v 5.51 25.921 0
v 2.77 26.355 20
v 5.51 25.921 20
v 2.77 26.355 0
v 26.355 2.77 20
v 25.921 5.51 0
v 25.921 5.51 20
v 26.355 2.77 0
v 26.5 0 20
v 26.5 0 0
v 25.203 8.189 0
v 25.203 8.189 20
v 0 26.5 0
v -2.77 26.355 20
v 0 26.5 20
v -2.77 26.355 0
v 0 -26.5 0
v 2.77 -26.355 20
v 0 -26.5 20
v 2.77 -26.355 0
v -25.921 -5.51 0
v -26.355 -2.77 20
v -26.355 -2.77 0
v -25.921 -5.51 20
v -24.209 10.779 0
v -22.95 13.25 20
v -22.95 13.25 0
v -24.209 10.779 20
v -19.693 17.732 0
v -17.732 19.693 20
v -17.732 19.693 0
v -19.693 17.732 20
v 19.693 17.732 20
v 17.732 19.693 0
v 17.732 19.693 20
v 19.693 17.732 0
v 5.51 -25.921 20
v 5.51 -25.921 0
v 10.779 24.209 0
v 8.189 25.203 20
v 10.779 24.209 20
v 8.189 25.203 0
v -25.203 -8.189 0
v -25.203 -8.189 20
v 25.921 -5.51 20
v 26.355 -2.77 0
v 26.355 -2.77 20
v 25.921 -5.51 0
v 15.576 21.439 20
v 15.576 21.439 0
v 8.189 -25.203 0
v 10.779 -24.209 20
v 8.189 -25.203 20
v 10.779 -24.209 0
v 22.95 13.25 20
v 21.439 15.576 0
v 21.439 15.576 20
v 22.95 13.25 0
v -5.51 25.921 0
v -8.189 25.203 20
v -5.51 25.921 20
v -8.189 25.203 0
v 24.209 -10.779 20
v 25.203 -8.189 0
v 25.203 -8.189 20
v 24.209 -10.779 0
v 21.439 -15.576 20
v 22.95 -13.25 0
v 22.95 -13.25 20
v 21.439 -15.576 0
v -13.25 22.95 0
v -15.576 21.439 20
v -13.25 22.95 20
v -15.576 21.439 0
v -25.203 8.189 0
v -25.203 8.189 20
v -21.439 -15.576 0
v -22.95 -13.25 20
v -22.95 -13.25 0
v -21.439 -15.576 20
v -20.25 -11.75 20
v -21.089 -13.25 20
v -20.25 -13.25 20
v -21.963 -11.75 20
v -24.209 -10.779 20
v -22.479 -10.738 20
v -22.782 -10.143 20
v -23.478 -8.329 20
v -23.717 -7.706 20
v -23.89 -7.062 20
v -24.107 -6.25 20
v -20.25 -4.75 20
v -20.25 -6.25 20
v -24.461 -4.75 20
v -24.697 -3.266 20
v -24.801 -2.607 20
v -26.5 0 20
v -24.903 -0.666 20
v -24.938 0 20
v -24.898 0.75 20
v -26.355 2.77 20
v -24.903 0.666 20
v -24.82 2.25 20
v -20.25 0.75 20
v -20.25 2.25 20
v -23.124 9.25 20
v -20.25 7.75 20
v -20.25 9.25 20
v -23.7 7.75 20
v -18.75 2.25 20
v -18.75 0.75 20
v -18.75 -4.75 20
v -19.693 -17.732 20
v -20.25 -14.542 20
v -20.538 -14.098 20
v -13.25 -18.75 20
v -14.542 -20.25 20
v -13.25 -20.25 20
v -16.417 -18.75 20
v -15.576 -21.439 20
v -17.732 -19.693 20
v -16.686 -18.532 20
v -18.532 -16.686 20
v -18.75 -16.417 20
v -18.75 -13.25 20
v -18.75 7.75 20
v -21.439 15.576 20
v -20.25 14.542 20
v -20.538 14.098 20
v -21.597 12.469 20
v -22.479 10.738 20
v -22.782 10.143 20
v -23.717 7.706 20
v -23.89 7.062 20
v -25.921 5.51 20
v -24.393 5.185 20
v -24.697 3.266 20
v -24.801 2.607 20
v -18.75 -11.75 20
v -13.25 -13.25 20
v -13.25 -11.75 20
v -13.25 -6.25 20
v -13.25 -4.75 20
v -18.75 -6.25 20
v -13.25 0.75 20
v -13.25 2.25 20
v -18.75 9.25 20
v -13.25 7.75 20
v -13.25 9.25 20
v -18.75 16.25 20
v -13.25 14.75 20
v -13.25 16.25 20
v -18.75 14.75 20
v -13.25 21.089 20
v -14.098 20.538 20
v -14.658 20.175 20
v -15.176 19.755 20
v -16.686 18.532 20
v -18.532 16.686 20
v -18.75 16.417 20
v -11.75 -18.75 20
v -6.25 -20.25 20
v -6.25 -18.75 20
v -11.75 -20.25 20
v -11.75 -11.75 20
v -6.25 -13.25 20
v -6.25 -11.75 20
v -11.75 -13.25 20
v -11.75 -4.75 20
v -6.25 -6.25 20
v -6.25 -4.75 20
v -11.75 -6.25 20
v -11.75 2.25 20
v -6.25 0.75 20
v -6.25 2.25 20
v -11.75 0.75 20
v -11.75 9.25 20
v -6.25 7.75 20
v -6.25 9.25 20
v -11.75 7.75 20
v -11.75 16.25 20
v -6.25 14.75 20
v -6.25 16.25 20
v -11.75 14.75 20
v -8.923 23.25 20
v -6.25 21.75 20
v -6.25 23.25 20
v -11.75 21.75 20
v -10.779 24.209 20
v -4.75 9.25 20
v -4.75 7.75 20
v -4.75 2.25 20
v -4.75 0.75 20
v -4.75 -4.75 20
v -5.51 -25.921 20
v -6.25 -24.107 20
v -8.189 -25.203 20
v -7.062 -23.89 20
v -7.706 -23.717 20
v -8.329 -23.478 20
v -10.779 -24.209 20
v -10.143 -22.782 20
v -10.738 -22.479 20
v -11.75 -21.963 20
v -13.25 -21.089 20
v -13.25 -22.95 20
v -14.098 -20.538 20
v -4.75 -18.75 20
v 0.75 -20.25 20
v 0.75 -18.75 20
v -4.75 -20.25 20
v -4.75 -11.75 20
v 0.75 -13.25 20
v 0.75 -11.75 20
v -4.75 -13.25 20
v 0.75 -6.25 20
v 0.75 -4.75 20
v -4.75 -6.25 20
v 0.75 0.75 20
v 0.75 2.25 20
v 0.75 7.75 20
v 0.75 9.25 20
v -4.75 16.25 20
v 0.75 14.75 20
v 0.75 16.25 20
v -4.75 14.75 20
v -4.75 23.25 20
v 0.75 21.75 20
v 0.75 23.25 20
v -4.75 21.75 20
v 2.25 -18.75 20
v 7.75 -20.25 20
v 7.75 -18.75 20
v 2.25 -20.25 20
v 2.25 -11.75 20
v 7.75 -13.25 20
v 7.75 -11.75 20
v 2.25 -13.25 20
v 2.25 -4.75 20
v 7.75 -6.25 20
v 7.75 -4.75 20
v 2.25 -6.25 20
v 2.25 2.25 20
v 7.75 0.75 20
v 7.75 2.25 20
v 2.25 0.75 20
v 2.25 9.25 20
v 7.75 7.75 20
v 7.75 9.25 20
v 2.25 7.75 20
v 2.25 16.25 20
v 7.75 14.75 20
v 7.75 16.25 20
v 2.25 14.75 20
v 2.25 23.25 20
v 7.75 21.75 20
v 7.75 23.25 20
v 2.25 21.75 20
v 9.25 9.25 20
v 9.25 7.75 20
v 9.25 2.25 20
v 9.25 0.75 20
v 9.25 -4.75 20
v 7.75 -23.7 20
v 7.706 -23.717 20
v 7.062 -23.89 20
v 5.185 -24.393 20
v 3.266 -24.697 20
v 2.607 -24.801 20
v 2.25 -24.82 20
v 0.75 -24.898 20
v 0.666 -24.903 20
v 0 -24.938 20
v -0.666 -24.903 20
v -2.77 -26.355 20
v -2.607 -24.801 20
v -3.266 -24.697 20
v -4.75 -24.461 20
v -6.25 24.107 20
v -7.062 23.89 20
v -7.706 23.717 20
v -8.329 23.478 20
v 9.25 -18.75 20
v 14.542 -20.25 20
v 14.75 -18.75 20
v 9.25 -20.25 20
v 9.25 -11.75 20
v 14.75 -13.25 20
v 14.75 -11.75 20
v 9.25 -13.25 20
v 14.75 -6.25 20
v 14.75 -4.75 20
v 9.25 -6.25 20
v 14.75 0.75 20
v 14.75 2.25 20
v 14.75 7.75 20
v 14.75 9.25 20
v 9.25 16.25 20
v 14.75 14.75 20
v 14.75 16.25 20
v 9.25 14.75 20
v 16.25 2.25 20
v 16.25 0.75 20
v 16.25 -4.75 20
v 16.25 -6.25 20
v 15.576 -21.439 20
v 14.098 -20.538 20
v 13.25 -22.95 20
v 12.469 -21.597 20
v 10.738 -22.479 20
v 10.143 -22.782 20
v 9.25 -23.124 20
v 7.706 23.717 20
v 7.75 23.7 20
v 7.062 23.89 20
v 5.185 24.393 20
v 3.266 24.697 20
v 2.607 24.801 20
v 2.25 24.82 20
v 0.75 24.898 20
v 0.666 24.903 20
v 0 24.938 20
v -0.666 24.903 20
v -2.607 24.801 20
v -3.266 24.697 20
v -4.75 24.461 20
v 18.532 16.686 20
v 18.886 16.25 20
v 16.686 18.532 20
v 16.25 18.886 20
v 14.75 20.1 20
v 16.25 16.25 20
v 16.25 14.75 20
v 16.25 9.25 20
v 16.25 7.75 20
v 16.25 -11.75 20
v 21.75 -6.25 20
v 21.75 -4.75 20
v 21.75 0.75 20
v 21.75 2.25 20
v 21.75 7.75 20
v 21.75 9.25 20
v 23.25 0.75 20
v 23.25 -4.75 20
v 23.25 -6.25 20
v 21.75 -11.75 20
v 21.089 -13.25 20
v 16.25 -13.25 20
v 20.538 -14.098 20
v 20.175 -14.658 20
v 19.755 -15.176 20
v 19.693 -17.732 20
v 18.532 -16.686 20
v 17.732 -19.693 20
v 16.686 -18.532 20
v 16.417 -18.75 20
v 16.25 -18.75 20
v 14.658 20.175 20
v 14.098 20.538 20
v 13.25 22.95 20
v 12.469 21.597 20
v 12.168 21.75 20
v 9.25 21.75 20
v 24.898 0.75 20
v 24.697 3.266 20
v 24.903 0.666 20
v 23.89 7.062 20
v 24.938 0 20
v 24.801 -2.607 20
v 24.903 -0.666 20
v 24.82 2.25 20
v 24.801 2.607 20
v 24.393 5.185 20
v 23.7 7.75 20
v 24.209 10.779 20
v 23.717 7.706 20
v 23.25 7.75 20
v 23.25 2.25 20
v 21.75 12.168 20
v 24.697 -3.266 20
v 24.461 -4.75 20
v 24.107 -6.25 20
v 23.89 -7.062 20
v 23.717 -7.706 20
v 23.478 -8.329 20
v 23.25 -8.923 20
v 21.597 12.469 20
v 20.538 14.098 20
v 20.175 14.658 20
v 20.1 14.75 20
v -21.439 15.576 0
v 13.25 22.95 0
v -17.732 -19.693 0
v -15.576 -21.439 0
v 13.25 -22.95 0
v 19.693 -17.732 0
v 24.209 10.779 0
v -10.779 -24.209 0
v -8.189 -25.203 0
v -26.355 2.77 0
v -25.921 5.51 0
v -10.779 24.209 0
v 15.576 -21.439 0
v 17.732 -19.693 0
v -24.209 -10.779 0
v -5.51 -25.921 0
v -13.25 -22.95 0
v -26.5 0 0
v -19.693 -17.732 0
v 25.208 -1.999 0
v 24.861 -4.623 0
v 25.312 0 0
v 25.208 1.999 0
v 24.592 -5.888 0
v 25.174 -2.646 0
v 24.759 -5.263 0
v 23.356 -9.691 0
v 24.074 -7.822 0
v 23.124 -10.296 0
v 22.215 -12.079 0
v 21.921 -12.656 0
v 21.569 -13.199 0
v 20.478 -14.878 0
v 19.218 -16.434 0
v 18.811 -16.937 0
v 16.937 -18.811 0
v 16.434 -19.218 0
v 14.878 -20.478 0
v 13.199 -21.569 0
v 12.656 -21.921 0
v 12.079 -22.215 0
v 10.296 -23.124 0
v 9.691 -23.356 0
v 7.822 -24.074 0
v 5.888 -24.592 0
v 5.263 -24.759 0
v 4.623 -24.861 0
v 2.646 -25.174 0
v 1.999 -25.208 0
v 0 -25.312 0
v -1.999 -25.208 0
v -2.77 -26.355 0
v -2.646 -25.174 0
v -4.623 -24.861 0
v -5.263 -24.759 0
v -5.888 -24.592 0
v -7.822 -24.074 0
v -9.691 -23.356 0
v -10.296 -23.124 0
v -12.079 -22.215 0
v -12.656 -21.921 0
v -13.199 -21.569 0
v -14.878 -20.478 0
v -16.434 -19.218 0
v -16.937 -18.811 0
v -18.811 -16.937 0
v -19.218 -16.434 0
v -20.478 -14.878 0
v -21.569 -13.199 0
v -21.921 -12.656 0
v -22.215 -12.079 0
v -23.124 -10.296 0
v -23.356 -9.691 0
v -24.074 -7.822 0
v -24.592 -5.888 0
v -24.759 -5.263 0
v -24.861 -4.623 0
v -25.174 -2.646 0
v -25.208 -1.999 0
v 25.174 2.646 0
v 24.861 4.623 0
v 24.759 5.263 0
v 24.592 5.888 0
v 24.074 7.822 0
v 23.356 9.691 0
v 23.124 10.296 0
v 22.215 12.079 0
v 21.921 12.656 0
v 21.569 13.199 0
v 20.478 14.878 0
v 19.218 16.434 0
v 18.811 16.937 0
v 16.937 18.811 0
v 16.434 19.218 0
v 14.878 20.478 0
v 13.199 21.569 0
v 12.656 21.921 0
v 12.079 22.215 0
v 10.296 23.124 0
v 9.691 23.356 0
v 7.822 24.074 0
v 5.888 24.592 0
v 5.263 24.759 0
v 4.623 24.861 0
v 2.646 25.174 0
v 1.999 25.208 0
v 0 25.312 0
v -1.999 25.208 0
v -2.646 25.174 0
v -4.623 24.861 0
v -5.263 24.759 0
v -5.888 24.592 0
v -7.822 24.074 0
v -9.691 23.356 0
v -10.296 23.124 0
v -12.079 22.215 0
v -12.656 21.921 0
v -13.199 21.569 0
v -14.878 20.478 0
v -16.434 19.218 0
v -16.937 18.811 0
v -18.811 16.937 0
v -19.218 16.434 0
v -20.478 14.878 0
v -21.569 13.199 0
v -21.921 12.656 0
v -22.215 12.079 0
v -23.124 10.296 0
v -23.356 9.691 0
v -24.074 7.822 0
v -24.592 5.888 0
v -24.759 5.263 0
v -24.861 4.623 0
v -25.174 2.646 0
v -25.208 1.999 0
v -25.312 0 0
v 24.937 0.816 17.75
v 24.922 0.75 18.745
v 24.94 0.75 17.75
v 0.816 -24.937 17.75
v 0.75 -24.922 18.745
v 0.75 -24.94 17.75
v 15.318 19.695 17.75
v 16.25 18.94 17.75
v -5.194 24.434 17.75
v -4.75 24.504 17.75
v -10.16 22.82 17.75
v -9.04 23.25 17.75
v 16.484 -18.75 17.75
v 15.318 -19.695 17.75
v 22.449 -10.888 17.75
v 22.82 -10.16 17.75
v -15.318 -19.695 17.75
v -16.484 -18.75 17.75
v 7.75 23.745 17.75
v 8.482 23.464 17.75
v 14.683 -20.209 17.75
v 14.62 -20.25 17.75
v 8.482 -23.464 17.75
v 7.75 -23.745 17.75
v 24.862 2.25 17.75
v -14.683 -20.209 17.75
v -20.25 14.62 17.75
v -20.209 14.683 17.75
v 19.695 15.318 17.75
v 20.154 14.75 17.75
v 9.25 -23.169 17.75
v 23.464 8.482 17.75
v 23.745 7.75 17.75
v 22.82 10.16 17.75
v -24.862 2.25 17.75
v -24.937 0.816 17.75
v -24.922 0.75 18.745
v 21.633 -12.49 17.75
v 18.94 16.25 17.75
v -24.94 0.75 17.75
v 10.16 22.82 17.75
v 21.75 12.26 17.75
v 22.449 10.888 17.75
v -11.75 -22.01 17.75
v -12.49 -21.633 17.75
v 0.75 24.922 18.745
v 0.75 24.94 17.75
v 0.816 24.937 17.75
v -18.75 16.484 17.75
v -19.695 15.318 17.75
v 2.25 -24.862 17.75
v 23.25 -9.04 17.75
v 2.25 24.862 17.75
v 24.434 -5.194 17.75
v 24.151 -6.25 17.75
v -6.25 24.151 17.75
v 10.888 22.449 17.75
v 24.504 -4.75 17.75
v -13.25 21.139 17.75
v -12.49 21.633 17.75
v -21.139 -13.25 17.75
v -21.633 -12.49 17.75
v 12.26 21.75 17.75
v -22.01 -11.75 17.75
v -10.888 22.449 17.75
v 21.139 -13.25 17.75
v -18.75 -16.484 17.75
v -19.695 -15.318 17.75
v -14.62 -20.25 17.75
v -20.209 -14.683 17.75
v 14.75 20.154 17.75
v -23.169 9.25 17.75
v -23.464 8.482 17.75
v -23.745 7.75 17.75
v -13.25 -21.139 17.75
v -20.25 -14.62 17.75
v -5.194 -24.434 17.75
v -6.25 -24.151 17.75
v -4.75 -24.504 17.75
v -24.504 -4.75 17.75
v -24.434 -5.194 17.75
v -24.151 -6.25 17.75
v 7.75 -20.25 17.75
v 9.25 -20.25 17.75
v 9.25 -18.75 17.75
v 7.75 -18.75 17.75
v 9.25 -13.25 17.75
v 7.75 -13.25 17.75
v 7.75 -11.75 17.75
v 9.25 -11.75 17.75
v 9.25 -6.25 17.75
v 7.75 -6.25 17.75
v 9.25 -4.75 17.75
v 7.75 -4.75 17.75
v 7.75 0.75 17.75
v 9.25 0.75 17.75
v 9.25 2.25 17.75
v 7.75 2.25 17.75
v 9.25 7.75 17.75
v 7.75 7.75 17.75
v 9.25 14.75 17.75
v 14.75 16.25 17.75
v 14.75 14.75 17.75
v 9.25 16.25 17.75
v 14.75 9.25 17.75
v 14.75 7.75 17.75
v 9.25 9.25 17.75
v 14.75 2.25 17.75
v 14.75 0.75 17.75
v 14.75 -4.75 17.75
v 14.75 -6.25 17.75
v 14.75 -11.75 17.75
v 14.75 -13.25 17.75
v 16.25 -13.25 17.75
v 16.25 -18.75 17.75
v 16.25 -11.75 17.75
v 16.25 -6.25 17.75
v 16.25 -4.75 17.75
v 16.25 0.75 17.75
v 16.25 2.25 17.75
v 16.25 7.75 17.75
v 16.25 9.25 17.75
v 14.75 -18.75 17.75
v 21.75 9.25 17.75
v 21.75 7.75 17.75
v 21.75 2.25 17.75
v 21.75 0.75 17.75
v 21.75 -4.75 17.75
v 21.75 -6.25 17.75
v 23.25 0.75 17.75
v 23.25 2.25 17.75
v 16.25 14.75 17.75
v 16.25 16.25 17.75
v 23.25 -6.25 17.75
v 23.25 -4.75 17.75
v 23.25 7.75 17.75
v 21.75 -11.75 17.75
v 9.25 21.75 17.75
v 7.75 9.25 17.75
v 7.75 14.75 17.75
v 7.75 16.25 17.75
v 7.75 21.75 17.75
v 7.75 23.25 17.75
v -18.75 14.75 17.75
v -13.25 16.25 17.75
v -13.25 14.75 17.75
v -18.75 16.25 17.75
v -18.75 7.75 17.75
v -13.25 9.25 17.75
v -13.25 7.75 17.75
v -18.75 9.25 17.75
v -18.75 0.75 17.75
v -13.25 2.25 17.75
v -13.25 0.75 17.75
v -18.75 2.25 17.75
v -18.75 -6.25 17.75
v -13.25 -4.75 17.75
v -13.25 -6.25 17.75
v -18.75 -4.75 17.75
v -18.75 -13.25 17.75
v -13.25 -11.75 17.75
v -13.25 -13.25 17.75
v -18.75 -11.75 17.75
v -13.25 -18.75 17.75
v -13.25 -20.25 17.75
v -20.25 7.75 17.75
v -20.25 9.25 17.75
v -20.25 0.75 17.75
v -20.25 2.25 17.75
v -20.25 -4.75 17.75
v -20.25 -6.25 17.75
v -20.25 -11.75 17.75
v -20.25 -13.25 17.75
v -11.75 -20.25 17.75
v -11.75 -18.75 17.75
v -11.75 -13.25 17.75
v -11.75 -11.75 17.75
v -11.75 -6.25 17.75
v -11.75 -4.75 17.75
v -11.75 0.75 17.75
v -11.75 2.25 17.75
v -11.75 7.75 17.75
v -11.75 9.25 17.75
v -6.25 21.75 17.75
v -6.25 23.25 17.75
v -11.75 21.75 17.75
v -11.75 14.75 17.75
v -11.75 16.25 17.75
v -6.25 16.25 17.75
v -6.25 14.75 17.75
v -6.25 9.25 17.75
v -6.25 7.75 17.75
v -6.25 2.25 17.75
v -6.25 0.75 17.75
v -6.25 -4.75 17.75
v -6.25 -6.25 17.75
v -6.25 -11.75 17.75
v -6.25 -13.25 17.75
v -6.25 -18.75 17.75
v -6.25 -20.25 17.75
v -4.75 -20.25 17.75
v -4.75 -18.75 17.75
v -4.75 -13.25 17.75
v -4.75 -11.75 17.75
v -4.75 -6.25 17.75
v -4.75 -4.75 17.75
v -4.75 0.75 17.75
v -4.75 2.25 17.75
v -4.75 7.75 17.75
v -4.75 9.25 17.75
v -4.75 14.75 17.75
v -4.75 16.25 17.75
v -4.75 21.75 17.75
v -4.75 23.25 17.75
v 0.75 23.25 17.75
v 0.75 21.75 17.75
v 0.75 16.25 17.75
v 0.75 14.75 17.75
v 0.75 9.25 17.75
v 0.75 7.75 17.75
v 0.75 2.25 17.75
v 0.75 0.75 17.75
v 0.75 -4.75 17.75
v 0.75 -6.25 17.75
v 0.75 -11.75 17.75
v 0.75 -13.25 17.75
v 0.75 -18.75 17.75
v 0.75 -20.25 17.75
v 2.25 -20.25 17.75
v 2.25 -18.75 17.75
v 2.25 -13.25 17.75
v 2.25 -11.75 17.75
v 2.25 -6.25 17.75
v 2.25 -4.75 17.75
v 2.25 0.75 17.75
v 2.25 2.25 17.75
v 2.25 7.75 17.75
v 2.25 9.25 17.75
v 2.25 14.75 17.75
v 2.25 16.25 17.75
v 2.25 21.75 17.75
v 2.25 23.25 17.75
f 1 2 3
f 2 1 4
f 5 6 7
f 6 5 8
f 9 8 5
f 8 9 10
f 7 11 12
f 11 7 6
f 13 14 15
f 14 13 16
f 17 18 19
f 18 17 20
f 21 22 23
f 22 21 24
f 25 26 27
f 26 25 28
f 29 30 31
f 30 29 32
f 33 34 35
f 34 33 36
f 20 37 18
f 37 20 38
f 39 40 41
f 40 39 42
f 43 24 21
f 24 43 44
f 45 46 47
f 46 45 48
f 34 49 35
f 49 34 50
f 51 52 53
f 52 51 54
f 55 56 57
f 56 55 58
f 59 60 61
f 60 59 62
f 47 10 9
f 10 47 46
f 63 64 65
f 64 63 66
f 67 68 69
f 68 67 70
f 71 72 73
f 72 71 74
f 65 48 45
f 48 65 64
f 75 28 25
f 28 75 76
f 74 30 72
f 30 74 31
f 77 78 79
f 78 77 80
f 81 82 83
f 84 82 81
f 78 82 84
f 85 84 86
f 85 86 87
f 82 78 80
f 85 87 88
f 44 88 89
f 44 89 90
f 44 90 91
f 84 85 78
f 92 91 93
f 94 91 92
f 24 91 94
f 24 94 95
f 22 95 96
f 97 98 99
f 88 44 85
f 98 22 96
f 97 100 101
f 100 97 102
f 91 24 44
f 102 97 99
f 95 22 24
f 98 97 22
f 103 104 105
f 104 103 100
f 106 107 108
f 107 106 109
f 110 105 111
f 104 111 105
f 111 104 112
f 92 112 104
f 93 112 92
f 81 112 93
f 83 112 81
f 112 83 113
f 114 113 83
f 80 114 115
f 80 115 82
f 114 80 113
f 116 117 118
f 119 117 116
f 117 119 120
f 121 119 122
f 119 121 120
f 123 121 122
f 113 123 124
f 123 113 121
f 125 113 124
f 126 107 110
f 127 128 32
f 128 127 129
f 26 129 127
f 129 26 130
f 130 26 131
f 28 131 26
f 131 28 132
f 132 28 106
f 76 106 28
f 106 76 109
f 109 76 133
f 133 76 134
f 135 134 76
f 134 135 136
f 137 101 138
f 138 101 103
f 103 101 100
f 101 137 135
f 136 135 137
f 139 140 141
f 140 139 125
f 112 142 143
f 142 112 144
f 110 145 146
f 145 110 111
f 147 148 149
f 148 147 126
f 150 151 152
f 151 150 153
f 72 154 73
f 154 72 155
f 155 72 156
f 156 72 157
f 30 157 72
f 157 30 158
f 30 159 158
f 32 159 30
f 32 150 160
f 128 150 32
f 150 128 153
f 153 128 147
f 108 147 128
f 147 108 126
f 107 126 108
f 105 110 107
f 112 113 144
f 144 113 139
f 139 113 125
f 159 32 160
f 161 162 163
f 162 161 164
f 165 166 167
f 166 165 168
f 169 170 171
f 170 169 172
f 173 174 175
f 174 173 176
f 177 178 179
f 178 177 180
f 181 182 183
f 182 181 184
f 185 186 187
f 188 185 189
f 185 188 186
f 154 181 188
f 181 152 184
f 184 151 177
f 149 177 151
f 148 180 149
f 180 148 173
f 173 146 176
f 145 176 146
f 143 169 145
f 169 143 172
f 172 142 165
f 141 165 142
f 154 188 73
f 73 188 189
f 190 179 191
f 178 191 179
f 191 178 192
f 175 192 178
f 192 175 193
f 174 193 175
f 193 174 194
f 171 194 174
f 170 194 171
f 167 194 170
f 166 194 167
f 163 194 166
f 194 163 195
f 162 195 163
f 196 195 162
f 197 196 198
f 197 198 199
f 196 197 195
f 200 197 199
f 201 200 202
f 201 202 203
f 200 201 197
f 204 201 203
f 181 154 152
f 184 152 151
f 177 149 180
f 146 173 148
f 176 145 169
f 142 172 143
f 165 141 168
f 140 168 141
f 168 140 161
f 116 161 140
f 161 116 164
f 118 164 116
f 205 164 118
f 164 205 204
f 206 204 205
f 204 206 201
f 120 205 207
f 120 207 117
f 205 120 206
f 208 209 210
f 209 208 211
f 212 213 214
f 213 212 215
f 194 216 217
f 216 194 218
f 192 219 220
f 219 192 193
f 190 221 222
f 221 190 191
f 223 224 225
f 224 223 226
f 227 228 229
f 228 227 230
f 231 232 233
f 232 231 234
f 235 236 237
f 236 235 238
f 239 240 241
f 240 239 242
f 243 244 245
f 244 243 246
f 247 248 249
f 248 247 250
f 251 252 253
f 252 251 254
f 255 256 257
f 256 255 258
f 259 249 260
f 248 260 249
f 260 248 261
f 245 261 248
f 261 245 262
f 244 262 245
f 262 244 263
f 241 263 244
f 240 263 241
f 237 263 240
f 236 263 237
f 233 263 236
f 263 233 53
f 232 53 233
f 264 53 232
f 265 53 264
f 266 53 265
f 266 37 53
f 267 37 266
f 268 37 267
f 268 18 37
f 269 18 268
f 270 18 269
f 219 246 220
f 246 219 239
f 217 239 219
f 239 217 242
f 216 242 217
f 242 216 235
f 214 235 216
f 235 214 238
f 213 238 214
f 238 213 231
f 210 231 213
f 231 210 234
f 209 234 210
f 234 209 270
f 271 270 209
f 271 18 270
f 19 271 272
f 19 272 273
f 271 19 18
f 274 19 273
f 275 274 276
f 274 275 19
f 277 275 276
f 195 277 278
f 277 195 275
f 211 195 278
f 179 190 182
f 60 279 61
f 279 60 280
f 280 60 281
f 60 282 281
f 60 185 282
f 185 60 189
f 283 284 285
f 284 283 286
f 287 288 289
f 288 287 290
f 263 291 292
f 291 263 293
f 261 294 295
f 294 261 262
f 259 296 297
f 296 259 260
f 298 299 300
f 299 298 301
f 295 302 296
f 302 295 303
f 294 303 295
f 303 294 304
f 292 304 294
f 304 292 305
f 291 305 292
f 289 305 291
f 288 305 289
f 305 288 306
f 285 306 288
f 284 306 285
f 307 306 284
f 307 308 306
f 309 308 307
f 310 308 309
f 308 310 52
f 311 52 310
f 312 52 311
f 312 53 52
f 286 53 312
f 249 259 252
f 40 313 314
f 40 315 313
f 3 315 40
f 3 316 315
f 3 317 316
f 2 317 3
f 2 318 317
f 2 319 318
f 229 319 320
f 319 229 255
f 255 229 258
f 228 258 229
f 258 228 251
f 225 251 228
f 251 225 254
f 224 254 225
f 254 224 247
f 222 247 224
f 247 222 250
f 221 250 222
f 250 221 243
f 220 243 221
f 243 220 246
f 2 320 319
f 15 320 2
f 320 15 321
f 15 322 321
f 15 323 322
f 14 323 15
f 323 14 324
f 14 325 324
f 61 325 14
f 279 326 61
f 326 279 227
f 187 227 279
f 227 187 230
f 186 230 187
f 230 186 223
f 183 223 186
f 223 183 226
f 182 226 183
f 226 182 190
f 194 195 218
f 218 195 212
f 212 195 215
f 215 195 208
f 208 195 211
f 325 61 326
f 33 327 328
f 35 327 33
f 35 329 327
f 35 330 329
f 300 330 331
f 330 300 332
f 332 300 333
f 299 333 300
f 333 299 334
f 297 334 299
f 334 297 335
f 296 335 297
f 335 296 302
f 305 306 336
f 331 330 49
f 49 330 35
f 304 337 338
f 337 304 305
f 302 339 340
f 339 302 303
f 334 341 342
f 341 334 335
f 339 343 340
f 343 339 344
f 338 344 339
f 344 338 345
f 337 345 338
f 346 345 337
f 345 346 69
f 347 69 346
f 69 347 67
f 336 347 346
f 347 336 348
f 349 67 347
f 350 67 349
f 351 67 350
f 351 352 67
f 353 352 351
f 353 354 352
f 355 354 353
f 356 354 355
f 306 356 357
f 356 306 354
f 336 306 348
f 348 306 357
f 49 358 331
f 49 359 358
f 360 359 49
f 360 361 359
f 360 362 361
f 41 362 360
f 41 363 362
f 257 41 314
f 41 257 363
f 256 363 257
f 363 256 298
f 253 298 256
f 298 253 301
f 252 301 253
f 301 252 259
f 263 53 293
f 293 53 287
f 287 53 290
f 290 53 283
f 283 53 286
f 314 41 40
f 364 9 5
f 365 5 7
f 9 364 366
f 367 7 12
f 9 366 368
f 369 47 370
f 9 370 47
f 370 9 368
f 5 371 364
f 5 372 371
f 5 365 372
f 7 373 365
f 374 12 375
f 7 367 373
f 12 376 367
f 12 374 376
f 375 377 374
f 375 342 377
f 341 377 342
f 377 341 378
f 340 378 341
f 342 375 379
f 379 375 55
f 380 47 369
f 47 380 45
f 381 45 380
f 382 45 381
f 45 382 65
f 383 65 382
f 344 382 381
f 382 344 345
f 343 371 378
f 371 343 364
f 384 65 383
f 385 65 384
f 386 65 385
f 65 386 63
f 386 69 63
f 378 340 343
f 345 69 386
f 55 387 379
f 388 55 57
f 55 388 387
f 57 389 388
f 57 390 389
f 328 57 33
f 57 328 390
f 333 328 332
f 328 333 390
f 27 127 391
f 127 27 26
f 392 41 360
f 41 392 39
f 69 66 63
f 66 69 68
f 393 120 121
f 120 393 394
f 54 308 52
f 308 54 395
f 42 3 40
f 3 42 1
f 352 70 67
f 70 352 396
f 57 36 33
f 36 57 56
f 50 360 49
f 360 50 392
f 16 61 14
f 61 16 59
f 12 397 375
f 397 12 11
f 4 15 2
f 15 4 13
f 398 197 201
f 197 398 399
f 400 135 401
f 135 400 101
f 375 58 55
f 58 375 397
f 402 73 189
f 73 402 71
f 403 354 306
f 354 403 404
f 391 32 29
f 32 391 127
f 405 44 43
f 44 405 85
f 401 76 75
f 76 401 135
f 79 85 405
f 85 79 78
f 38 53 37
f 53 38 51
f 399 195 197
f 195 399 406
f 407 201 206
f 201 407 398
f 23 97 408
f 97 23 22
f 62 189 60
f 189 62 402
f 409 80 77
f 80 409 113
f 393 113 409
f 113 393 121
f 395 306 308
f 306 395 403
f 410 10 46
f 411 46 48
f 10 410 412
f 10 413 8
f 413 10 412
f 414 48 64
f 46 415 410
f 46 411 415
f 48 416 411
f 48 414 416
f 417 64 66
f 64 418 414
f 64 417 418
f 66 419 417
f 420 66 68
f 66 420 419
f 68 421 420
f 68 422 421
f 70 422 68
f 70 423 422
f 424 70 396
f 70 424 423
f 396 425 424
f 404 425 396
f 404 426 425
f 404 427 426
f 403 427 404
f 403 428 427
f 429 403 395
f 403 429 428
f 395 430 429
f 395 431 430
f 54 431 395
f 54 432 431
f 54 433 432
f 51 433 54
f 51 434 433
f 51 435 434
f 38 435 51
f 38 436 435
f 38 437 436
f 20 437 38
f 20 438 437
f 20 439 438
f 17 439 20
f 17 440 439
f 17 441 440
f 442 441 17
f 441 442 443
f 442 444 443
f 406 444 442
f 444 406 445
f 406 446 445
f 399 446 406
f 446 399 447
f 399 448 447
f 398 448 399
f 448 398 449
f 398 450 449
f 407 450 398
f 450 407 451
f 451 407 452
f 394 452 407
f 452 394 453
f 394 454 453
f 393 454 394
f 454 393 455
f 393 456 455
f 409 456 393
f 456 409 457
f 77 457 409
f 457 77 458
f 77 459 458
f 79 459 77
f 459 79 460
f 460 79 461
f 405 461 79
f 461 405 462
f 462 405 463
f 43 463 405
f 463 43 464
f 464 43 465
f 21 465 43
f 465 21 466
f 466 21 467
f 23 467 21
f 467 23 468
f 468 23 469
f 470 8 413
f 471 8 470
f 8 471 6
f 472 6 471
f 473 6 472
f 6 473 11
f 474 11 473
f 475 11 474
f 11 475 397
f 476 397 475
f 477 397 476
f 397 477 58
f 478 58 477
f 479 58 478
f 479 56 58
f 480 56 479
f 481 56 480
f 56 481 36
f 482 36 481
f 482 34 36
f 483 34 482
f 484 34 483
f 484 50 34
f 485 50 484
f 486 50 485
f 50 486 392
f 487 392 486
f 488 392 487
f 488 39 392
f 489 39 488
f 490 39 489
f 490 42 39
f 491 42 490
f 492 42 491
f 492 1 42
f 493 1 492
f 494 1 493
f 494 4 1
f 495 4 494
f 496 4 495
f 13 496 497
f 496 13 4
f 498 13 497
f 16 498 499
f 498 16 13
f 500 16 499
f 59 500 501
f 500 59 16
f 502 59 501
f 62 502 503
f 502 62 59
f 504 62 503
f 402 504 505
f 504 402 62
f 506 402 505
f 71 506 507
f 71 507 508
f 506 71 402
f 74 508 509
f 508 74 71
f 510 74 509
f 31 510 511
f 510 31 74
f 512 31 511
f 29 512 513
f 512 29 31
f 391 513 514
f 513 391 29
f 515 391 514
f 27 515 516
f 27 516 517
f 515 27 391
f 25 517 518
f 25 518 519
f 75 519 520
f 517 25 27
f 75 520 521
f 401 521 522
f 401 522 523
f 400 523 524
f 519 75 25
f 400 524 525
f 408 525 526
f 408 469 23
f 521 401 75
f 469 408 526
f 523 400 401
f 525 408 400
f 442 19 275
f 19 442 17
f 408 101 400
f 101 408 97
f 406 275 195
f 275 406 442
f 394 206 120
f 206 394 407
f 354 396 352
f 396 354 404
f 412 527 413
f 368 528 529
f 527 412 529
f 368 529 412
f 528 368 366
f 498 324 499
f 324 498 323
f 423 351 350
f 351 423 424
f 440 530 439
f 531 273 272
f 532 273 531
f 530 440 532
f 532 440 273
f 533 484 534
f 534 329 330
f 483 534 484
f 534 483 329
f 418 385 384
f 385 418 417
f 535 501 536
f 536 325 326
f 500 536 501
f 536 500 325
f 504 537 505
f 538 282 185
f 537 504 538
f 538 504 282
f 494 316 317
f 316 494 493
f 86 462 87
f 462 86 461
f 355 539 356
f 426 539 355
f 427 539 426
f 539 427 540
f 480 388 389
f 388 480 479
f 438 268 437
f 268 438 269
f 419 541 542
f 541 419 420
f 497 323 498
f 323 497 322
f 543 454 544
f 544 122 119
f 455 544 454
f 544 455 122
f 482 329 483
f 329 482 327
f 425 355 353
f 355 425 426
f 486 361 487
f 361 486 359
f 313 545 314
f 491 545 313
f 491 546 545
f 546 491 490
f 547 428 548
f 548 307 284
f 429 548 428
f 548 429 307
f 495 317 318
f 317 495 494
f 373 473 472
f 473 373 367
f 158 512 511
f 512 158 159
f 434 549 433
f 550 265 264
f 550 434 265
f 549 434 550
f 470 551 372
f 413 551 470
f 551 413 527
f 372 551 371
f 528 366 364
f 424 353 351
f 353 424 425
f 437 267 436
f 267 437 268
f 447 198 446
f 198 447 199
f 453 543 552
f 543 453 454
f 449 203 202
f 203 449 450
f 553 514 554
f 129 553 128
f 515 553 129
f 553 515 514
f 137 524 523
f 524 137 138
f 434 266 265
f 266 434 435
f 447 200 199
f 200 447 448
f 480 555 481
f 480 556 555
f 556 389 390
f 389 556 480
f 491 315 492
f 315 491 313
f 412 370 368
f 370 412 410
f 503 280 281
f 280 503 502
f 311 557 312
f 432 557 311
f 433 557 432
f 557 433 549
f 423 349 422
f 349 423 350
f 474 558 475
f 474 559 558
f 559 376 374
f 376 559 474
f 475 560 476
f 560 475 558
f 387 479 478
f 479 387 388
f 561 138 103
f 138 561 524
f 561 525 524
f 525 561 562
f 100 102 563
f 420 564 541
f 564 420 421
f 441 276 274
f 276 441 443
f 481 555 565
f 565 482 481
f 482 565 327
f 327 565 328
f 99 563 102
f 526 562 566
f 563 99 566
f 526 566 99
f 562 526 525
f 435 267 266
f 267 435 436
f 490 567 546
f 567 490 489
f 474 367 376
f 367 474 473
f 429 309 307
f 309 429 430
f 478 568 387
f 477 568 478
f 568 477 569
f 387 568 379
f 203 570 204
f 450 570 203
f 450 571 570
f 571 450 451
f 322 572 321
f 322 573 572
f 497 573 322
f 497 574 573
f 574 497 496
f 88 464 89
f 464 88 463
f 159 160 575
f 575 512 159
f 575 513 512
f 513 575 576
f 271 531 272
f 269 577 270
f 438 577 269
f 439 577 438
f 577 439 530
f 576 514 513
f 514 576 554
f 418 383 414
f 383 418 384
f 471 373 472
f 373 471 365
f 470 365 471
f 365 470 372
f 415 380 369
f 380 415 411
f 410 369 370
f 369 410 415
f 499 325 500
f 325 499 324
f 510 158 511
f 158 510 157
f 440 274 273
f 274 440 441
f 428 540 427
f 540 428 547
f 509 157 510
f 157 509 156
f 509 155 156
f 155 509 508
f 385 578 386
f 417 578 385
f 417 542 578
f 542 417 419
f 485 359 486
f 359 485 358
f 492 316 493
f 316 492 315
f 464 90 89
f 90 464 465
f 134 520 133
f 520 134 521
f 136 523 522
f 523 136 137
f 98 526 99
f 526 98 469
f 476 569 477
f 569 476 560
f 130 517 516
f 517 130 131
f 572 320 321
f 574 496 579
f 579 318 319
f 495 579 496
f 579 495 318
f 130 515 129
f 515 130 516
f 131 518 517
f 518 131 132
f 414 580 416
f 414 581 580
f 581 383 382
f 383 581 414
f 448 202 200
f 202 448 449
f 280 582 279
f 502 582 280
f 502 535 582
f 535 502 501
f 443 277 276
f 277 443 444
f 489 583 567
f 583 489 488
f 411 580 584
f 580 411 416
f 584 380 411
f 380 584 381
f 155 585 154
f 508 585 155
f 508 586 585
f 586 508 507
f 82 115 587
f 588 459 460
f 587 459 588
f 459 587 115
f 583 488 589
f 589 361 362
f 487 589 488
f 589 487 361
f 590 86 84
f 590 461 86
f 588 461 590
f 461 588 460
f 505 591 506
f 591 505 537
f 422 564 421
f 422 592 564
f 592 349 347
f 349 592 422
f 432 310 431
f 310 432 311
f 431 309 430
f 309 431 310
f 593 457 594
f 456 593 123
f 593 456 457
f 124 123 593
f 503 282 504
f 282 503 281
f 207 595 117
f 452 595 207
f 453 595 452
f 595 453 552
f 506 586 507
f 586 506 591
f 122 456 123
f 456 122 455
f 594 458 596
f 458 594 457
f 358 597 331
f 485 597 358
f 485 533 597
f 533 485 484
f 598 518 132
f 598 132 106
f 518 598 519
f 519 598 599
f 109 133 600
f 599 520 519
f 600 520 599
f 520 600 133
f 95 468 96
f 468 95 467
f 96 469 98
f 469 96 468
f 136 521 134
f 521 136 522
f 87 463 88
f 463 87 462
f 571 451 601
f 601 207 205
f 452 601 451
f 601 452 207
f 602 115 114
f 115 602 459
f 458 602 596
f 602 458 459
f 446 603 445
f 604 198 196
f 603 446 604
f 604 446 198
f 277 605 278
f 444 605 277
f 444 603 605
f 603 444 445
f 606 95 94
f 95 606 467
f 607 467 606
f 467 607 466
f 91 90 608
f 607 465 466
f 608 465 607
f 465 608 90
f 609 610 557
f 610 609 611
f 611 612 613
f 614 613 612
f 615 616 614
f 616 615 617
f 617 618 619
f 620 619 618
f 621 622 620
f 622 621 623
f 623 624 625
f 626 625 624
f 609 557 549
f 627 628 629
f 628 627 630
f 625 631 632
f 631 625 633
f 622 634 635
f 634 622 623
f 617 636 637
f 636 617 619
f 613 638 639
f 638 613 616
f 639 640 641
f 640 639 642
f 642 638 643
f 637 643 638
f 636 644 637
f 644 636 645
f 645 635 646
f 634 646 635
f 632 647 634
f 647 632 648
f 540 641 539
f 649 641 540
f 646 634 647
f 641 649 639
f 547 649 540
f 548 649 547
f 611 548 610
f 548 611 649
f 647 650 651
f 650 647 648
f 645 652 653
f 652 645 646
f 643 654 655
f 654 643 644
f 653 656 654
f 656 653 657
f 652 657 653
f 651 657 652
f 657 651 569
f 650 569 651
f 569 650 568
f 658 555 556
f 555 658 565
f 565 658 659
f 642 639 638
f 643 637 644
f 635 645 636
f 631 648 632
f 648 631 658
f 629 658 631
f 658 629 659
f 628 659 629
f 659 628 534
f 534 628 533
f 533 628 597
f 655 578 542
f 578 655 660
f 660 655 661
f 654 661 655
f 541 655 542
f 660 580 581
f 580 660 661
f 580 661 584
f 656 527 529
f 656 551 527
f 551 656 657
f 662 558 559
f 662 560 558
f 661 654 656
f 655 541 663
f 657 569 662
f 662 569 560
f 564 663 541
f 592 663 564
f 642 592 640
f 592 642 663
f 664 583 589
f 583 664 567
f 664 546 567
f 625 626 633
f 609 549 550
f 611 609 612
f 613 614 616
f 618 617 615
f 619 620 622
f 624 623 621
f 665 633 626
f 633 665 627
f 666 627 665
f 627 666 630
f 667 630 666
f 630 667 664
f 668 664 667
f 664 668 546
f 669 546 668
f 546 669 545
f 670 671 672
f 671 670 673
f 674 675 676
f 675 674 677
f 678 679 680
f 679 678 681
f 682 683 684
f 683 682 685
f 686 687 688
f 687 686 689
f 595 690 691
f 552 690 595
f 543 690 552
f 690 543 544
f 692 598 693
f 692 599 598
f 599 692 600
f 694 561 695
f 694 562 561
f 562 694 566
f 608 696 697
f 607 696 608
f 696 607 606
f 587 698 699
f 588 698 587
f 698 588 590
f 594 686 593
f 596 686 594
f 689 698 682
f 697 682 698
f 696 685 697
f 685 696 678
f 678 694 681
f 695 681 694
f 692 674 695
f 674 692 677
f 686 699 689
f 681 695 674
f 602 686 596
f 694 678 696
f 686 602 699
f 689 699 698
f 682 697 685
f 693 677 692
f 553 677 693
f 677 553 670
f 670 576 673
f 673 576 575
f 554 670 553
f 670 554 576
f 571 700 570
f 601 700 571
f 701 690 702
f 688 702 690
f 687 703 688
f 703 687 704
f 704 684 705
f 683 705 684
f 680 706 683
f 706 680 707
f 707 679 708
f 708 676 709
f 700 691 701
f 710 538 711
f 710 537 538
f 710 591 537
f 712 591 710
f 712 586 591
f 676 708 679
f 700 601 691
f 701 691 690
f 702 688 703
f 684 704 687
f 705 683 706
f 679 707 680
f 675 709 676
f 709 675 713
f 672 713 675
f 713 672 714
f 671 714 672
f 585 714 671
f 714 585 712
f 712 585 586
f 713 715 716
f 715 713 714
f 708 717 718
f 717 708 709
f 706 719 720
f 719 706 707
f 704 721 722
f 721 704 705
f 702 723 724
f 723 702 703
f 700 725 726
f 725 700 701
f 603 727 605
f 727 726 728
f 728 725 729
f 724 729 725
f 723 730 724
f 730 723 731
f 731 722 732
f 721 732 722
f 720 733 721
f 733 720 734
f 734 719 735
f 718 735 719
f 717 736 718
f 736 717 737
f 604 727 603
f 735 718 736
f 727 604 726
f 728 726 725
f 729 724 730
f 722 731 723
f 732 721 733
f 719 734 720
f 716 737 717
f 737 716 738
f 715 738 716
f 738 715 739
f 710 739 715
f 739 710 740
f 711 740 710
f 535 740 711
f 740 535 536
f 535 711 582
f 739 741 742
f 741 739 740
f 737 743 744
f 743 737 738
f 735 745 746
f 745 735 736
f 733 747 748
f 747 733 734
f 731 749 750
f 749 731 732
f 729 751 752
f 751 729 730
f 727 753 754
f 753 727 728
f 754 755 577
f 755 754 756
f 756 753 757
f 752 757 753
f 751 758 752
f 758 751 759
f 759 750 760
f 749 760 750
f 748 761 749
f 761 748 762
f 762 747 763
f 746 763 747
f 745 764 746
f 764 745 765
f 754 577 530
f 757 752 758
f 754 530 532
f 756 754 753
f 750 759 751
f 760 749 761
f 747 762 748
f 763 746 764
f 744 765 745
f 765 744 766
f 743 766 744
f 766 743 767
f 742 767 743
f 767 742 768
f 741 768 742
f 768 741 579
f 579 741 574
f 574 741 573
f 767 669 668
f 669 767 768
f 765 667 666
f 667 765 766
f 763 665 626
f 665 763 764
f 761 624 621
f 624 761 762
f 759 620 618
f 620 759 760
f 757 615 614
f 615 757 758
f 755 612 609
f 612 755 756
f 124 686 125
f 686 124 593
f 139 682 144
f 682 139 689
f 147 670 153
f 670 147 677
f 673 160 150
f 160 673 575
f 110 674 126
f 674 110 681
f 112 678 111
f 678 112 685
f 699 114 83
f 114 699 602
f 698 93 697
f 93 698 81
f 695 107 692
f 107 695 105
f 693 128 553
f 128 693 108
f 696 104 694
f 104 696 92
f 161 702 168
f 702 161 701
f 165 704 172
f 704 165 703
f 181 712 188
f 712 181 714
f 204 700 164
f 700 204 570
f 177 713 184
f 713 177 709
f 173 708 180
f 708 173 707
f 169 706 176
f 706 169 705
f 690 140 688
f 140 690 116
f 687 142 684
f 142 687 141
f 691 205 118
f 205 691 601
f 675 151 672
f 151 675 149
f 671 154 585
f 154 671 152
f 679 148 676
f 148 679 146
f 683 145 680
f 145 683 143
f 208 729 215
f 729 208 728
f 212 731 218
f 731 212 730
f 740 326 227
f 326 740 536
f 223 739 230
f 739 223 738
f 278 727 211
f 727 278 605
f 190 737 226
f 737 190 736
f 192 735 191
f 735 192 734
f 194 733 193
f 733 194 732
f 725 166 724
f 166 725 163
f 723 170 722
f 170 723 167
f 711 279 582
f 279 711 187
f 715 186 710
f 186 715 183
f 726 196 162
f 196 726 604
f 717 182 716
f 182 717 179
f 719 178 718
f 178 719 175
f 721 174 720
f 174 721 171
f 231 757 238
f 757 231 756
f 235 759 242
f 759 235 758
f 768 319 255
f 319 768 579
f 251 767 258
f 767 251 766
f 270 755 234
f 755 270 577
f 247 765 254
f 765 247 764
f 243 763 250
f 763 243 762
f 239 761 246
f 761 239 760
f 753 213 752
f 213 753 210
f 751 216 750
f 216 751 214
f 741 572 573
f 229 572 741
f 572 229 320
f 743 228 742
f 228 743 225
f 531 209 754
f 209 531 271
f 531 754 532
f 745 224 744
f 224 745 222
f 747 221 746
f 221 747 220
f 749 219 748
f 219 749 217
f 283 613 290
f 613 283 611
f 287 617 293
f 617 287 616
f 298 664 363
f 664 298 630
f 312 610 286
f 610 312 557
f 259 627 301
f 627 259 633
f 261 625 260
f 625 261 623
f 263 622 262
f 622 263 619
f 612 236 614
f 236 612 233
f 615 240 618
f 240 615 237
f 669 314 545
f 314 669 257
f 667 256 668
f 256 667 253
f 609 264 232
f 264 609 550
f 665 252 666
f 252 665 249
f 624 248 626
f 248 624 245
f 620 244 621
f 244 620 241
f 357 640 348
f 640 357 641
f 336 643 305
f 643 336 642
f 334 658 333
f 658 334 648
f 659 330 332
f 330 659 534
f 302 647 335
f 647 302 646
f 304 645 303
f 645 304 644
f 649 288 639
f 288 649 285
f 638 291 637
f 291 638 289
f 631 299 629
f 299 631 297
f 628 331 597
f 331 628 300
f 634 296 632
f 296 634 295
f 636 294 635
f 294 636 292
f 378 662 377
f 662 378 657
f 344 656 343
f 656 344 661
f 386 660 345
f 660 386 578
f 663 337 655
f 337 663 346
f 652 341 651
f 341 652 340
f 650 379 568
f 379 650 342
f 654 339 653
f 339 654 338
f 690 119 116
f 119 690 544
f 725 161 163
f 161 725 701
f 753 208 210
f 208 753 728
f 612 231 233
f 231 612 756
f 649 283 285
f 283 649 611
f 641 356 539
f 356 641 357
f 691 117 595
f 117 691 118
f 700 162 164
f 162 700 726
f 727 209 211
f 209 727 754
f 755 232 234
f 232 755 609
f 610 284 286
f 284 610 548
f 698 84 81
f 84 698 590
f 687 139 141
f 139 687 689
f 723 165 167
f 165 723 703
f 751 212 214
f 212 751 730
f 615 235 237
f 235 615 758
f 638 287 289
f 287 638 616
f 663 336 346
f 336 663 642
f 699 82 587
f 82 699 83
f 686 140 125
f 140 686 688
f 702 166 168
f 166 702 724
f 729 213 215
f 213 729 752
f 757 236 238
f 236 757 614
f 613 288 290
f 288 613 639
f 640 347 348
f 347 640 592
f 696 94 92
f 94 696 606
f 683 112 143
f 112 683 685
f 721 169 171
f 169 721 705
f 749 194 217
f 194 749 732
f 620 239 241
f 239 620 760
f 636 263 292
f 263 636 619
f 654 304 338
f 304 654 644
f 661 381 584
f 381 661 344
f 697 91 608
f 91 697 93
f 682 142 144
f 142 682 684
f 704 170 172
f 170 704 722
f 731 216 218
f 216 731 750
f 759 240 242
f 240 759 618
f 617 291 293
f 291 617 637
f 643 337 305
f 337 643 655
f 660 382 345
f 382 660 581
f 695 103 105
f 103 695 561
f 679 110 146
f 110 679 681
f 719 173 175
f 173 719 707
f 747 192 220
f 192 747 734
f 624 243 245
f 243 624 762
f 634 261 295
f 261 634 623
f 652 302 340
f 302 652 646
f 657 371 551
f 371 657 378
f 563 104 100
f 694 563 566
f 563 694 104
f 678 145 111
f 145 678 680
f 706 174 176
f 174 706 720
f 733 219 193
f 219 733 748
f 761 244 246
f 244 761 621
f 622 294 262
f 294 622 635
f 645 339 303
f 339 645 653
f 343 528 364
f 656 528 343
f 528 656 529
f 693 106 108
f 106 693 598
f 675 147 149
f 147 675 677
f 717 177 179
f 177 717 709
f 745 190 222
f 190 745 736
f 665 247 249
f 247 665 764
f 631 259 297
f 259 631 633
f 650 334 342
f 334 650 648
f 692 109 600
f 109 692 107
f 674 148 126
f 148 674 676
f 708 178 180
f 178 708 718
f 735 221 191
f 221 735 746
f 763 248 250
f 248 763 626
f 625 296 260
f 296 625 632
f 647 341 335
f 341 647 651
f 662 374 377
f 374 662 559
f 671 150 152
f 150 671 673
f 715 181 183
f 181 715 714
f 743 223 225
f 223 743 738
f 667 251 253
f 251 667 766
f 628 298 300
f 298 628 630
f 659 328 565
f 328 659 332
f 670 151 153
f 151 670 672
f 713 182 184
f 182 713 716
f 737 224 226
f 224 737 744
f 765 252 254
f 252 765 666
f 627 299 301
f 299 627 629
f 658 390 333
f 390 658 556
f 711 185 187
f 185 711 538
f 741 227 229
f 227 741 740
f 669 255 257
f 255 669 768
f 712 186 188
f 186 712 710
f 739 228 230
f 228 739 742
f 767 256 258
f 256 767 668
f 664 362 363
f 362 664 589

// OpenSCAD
$fn = 60;

Internal_diameter_top = 49.5;
Internal_diameter_bottom = 51;
External_diameter = 53;
Grid_width = 1.5;
Grid_height = 3;
Grid_interval = 7;
Hole_diameter = 0;
Height = 20;

module main() {
    module holes() {
        for (angle = [0 : 45 : 360]) {
            translate([0, 0, Height / 2]) {
                rotate([0, 90, angle]) {
                    cylinder(r=Hole_diameter / 2, h=External_diameter * 2, center=true);
                }
            }
        }
    }

    difference() {
        cylinder(r=External_diameter / 2, h=Height);
        translate([0, 0, -Height / 2]) {
            cylinder(r1=Internal_diameter_bottom / 2, r2=Internal_diameter_top / 2, h=Height * 2);
        }

        if (Hole_diameter) {
            holes();
        }
    }

    module grid() {
        width = 1.5;
        intersection() {
            cylinder(r=External_diameter / 2, h=Height);

            union() {
                for (x = [-External_diameter / 2 : Grid_interval : External_diameter / 2]) {
                    translate([x, 0, Height - width / 2]) {
                        cube(size=[width, External_diameter, Grid_height], center=true);
                    }
                }

                for (y = [-External_diameter / 2 : Grid_interval : External_diameter / 2]) {
                    translate([0, y, Height - width / 2]) {
                        cube(size=[External_diameter, width, Grid_height], center=true);
                    }
                }
            }
        }
    }

    grid();
}

main();
